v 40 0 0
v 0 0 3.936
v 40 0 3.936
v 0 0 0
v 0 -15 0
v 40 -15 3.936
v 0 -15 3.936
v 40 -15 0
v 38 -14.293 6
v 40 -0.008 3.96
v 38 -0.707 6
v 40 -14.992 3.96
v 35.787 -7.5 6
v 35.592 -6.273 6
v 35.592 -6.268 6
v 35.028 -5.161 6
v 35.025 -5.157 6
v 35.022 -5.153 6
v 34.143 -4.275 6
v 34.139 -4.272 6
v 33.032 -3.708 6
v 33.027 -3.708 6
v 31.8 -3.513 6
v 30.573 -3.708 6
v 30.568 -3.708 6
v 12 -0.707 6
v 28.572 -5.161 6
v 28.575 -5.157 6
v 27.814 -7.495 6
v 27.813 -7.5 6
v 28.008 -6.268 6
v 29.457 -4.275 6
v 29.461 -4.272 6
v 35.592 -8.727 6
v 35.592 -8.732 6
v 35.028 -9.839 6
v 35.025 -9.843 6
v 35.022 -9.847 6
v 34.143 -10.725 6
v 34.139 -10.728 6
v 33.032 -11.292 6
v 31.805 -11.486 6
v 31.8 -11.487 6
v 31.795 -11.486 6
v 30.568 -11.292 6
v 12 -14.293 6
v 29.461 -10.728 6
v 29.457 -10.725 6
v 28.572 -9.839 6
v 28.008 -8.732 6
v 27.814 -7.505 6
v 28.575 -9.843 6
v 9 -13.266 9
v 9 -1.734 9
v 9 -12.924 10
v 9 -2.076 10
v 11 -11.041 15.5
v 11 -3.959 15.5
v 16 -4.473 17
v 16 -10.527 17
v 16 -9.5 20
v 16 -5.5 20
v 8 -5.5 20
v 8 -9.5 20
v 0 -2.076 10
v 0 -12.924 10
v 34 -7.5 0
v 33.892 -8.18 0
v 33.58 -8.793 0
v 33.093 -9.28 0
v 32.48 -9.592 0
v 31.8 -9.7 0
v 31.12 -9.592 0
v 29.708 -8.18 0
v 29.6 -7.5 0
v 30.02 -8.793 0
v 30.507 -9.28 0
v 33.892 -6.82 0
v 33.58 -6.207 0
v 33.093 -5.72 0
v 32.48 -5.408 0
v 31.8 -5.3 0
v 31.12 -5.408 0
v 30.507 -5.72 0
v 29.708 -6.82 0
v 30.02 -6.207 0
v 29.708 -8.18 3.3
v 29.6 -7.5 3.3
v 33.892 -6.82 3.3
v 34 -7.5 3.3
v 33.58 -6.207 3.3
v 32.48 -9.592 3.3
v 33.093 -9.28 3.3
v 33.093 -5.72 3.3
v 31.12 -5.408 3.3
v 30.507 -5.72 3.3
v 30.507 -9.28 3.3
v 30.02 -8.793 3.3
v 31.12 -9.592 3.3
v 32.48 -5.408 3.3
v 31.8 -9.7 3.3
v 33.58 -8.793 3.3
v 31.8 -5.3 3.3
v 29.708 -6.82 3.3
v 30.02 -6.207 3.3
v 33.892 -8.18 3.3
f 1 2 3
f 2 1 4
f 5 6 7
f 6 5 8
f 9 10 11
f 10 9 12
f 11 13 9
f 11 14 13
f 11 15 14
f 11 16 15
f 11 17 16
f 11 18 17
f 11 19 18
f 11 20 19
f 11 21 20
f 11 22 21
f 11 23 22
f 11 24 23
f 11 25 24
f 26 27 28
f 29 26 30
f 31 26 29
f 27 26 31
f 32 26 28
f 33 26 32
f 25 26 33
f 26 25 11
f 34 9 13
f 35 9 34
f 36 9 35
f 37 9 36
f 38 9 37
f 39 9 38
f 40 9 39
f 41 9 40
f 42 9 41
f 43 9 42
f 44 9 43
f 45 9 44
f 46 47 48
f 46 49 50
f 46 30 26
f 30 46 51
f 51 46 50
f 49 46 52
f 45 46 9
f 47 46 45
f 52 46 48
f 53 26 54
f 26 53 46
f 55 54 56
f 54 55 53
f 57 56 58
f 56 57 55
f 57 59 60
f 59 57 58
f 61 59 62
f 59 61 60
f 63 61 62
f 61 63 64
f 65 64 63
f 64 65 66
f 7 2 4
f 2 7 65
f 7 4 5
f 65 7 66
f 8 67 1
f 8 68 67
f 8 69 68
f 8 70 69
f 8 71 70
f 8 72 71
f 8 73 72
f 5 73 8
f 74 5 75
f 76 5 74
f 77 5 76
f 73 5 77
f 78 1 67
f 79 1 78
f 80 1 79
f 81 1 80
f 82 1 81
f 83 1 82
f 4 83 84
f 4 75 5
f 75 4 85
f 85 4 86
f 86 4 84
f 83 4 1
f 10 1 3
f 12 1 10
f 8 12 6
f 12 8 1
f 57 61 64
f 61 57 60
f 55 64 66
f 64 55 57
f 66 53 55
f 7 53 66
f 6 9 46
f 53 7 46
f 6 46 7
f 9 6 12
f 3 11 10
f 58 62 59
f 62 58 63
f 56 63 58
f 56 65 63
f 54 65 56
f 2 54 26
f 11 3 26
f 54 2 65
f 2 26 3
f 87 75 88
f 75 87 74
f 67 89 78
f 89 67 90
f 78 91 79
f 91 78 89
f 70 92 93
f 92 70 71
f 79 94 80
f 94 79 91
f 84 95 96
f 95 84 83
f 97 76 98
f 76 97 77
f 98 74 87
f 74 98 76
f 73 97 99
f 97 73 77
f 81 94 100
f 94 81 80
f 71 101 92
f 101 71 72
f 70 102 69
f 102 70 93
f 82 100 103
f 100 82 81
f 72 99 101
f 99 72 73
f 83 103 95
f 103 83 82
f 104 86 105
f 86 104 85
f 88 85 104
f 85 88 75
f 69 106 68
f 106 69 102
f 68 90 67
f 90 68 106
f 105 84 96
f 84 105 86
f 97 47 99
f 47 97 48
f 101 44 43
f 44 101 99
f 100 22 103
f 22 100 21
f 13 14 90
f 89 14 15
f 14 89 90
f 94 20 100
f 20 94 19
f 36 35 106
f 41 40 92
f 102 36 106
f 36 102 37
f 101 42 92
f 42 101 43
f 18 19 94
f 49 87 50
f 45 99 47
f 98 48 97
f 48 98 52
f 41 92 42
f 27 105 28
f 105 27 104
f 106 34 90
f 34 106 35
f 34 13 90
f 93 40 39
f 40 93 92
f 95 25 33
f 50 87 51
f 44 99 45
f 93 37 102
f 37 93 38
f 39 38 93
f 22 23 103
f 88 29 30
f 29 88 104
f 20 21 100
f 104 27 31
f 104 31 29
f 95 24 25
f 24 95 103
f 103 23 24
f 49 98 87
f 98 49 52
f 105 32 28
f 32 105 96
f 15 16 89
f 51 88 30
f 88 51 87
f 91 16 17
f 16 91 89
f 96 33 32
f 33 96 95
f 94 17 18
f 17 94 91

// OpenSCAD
h = 40;
d = 20;
s = 6;

//hook height
hh = h/2.5;

$fn = 20;

w = 15;
w2 = 4;

ang = 18.9;

hole_r = 2.2;
hole_r2 = 4;
hole_h2 = 2.7;
hole_h = h - hole_r - s;


rotate([90,0,0])
difference() {
    linear_extrude(w) polygon([[0,0],[0,d/2],[hh/2,d],[hh,d],[hh,d-s/2],[hh/2+s/2,d-s*0.75],[s*1.5,d/2],[s*1.5,s*1.5],[s*2,s],[h-s/3,s],[h,s*0.66],[h,0]]);

    translate([0,d,w/2+w2/2]) rotate([90-ang,0,0]) cube(1000,1000,1000);
    translate([0,d,w/2-w2/2]) rotate([ang,0,0]) translate([0,-1000,-1000]) cube(1000,1000,1000);

    translate([hole_h,0,w/2]) rotate([-90,0,0]) cylinder(s,hole_r,hole_r);
    translate([hole_h,s-hole_h2,w/2]) rotate([-90,0,0]) cylinder(hole_h2+0.02,hole_r,hole_r2);

}
